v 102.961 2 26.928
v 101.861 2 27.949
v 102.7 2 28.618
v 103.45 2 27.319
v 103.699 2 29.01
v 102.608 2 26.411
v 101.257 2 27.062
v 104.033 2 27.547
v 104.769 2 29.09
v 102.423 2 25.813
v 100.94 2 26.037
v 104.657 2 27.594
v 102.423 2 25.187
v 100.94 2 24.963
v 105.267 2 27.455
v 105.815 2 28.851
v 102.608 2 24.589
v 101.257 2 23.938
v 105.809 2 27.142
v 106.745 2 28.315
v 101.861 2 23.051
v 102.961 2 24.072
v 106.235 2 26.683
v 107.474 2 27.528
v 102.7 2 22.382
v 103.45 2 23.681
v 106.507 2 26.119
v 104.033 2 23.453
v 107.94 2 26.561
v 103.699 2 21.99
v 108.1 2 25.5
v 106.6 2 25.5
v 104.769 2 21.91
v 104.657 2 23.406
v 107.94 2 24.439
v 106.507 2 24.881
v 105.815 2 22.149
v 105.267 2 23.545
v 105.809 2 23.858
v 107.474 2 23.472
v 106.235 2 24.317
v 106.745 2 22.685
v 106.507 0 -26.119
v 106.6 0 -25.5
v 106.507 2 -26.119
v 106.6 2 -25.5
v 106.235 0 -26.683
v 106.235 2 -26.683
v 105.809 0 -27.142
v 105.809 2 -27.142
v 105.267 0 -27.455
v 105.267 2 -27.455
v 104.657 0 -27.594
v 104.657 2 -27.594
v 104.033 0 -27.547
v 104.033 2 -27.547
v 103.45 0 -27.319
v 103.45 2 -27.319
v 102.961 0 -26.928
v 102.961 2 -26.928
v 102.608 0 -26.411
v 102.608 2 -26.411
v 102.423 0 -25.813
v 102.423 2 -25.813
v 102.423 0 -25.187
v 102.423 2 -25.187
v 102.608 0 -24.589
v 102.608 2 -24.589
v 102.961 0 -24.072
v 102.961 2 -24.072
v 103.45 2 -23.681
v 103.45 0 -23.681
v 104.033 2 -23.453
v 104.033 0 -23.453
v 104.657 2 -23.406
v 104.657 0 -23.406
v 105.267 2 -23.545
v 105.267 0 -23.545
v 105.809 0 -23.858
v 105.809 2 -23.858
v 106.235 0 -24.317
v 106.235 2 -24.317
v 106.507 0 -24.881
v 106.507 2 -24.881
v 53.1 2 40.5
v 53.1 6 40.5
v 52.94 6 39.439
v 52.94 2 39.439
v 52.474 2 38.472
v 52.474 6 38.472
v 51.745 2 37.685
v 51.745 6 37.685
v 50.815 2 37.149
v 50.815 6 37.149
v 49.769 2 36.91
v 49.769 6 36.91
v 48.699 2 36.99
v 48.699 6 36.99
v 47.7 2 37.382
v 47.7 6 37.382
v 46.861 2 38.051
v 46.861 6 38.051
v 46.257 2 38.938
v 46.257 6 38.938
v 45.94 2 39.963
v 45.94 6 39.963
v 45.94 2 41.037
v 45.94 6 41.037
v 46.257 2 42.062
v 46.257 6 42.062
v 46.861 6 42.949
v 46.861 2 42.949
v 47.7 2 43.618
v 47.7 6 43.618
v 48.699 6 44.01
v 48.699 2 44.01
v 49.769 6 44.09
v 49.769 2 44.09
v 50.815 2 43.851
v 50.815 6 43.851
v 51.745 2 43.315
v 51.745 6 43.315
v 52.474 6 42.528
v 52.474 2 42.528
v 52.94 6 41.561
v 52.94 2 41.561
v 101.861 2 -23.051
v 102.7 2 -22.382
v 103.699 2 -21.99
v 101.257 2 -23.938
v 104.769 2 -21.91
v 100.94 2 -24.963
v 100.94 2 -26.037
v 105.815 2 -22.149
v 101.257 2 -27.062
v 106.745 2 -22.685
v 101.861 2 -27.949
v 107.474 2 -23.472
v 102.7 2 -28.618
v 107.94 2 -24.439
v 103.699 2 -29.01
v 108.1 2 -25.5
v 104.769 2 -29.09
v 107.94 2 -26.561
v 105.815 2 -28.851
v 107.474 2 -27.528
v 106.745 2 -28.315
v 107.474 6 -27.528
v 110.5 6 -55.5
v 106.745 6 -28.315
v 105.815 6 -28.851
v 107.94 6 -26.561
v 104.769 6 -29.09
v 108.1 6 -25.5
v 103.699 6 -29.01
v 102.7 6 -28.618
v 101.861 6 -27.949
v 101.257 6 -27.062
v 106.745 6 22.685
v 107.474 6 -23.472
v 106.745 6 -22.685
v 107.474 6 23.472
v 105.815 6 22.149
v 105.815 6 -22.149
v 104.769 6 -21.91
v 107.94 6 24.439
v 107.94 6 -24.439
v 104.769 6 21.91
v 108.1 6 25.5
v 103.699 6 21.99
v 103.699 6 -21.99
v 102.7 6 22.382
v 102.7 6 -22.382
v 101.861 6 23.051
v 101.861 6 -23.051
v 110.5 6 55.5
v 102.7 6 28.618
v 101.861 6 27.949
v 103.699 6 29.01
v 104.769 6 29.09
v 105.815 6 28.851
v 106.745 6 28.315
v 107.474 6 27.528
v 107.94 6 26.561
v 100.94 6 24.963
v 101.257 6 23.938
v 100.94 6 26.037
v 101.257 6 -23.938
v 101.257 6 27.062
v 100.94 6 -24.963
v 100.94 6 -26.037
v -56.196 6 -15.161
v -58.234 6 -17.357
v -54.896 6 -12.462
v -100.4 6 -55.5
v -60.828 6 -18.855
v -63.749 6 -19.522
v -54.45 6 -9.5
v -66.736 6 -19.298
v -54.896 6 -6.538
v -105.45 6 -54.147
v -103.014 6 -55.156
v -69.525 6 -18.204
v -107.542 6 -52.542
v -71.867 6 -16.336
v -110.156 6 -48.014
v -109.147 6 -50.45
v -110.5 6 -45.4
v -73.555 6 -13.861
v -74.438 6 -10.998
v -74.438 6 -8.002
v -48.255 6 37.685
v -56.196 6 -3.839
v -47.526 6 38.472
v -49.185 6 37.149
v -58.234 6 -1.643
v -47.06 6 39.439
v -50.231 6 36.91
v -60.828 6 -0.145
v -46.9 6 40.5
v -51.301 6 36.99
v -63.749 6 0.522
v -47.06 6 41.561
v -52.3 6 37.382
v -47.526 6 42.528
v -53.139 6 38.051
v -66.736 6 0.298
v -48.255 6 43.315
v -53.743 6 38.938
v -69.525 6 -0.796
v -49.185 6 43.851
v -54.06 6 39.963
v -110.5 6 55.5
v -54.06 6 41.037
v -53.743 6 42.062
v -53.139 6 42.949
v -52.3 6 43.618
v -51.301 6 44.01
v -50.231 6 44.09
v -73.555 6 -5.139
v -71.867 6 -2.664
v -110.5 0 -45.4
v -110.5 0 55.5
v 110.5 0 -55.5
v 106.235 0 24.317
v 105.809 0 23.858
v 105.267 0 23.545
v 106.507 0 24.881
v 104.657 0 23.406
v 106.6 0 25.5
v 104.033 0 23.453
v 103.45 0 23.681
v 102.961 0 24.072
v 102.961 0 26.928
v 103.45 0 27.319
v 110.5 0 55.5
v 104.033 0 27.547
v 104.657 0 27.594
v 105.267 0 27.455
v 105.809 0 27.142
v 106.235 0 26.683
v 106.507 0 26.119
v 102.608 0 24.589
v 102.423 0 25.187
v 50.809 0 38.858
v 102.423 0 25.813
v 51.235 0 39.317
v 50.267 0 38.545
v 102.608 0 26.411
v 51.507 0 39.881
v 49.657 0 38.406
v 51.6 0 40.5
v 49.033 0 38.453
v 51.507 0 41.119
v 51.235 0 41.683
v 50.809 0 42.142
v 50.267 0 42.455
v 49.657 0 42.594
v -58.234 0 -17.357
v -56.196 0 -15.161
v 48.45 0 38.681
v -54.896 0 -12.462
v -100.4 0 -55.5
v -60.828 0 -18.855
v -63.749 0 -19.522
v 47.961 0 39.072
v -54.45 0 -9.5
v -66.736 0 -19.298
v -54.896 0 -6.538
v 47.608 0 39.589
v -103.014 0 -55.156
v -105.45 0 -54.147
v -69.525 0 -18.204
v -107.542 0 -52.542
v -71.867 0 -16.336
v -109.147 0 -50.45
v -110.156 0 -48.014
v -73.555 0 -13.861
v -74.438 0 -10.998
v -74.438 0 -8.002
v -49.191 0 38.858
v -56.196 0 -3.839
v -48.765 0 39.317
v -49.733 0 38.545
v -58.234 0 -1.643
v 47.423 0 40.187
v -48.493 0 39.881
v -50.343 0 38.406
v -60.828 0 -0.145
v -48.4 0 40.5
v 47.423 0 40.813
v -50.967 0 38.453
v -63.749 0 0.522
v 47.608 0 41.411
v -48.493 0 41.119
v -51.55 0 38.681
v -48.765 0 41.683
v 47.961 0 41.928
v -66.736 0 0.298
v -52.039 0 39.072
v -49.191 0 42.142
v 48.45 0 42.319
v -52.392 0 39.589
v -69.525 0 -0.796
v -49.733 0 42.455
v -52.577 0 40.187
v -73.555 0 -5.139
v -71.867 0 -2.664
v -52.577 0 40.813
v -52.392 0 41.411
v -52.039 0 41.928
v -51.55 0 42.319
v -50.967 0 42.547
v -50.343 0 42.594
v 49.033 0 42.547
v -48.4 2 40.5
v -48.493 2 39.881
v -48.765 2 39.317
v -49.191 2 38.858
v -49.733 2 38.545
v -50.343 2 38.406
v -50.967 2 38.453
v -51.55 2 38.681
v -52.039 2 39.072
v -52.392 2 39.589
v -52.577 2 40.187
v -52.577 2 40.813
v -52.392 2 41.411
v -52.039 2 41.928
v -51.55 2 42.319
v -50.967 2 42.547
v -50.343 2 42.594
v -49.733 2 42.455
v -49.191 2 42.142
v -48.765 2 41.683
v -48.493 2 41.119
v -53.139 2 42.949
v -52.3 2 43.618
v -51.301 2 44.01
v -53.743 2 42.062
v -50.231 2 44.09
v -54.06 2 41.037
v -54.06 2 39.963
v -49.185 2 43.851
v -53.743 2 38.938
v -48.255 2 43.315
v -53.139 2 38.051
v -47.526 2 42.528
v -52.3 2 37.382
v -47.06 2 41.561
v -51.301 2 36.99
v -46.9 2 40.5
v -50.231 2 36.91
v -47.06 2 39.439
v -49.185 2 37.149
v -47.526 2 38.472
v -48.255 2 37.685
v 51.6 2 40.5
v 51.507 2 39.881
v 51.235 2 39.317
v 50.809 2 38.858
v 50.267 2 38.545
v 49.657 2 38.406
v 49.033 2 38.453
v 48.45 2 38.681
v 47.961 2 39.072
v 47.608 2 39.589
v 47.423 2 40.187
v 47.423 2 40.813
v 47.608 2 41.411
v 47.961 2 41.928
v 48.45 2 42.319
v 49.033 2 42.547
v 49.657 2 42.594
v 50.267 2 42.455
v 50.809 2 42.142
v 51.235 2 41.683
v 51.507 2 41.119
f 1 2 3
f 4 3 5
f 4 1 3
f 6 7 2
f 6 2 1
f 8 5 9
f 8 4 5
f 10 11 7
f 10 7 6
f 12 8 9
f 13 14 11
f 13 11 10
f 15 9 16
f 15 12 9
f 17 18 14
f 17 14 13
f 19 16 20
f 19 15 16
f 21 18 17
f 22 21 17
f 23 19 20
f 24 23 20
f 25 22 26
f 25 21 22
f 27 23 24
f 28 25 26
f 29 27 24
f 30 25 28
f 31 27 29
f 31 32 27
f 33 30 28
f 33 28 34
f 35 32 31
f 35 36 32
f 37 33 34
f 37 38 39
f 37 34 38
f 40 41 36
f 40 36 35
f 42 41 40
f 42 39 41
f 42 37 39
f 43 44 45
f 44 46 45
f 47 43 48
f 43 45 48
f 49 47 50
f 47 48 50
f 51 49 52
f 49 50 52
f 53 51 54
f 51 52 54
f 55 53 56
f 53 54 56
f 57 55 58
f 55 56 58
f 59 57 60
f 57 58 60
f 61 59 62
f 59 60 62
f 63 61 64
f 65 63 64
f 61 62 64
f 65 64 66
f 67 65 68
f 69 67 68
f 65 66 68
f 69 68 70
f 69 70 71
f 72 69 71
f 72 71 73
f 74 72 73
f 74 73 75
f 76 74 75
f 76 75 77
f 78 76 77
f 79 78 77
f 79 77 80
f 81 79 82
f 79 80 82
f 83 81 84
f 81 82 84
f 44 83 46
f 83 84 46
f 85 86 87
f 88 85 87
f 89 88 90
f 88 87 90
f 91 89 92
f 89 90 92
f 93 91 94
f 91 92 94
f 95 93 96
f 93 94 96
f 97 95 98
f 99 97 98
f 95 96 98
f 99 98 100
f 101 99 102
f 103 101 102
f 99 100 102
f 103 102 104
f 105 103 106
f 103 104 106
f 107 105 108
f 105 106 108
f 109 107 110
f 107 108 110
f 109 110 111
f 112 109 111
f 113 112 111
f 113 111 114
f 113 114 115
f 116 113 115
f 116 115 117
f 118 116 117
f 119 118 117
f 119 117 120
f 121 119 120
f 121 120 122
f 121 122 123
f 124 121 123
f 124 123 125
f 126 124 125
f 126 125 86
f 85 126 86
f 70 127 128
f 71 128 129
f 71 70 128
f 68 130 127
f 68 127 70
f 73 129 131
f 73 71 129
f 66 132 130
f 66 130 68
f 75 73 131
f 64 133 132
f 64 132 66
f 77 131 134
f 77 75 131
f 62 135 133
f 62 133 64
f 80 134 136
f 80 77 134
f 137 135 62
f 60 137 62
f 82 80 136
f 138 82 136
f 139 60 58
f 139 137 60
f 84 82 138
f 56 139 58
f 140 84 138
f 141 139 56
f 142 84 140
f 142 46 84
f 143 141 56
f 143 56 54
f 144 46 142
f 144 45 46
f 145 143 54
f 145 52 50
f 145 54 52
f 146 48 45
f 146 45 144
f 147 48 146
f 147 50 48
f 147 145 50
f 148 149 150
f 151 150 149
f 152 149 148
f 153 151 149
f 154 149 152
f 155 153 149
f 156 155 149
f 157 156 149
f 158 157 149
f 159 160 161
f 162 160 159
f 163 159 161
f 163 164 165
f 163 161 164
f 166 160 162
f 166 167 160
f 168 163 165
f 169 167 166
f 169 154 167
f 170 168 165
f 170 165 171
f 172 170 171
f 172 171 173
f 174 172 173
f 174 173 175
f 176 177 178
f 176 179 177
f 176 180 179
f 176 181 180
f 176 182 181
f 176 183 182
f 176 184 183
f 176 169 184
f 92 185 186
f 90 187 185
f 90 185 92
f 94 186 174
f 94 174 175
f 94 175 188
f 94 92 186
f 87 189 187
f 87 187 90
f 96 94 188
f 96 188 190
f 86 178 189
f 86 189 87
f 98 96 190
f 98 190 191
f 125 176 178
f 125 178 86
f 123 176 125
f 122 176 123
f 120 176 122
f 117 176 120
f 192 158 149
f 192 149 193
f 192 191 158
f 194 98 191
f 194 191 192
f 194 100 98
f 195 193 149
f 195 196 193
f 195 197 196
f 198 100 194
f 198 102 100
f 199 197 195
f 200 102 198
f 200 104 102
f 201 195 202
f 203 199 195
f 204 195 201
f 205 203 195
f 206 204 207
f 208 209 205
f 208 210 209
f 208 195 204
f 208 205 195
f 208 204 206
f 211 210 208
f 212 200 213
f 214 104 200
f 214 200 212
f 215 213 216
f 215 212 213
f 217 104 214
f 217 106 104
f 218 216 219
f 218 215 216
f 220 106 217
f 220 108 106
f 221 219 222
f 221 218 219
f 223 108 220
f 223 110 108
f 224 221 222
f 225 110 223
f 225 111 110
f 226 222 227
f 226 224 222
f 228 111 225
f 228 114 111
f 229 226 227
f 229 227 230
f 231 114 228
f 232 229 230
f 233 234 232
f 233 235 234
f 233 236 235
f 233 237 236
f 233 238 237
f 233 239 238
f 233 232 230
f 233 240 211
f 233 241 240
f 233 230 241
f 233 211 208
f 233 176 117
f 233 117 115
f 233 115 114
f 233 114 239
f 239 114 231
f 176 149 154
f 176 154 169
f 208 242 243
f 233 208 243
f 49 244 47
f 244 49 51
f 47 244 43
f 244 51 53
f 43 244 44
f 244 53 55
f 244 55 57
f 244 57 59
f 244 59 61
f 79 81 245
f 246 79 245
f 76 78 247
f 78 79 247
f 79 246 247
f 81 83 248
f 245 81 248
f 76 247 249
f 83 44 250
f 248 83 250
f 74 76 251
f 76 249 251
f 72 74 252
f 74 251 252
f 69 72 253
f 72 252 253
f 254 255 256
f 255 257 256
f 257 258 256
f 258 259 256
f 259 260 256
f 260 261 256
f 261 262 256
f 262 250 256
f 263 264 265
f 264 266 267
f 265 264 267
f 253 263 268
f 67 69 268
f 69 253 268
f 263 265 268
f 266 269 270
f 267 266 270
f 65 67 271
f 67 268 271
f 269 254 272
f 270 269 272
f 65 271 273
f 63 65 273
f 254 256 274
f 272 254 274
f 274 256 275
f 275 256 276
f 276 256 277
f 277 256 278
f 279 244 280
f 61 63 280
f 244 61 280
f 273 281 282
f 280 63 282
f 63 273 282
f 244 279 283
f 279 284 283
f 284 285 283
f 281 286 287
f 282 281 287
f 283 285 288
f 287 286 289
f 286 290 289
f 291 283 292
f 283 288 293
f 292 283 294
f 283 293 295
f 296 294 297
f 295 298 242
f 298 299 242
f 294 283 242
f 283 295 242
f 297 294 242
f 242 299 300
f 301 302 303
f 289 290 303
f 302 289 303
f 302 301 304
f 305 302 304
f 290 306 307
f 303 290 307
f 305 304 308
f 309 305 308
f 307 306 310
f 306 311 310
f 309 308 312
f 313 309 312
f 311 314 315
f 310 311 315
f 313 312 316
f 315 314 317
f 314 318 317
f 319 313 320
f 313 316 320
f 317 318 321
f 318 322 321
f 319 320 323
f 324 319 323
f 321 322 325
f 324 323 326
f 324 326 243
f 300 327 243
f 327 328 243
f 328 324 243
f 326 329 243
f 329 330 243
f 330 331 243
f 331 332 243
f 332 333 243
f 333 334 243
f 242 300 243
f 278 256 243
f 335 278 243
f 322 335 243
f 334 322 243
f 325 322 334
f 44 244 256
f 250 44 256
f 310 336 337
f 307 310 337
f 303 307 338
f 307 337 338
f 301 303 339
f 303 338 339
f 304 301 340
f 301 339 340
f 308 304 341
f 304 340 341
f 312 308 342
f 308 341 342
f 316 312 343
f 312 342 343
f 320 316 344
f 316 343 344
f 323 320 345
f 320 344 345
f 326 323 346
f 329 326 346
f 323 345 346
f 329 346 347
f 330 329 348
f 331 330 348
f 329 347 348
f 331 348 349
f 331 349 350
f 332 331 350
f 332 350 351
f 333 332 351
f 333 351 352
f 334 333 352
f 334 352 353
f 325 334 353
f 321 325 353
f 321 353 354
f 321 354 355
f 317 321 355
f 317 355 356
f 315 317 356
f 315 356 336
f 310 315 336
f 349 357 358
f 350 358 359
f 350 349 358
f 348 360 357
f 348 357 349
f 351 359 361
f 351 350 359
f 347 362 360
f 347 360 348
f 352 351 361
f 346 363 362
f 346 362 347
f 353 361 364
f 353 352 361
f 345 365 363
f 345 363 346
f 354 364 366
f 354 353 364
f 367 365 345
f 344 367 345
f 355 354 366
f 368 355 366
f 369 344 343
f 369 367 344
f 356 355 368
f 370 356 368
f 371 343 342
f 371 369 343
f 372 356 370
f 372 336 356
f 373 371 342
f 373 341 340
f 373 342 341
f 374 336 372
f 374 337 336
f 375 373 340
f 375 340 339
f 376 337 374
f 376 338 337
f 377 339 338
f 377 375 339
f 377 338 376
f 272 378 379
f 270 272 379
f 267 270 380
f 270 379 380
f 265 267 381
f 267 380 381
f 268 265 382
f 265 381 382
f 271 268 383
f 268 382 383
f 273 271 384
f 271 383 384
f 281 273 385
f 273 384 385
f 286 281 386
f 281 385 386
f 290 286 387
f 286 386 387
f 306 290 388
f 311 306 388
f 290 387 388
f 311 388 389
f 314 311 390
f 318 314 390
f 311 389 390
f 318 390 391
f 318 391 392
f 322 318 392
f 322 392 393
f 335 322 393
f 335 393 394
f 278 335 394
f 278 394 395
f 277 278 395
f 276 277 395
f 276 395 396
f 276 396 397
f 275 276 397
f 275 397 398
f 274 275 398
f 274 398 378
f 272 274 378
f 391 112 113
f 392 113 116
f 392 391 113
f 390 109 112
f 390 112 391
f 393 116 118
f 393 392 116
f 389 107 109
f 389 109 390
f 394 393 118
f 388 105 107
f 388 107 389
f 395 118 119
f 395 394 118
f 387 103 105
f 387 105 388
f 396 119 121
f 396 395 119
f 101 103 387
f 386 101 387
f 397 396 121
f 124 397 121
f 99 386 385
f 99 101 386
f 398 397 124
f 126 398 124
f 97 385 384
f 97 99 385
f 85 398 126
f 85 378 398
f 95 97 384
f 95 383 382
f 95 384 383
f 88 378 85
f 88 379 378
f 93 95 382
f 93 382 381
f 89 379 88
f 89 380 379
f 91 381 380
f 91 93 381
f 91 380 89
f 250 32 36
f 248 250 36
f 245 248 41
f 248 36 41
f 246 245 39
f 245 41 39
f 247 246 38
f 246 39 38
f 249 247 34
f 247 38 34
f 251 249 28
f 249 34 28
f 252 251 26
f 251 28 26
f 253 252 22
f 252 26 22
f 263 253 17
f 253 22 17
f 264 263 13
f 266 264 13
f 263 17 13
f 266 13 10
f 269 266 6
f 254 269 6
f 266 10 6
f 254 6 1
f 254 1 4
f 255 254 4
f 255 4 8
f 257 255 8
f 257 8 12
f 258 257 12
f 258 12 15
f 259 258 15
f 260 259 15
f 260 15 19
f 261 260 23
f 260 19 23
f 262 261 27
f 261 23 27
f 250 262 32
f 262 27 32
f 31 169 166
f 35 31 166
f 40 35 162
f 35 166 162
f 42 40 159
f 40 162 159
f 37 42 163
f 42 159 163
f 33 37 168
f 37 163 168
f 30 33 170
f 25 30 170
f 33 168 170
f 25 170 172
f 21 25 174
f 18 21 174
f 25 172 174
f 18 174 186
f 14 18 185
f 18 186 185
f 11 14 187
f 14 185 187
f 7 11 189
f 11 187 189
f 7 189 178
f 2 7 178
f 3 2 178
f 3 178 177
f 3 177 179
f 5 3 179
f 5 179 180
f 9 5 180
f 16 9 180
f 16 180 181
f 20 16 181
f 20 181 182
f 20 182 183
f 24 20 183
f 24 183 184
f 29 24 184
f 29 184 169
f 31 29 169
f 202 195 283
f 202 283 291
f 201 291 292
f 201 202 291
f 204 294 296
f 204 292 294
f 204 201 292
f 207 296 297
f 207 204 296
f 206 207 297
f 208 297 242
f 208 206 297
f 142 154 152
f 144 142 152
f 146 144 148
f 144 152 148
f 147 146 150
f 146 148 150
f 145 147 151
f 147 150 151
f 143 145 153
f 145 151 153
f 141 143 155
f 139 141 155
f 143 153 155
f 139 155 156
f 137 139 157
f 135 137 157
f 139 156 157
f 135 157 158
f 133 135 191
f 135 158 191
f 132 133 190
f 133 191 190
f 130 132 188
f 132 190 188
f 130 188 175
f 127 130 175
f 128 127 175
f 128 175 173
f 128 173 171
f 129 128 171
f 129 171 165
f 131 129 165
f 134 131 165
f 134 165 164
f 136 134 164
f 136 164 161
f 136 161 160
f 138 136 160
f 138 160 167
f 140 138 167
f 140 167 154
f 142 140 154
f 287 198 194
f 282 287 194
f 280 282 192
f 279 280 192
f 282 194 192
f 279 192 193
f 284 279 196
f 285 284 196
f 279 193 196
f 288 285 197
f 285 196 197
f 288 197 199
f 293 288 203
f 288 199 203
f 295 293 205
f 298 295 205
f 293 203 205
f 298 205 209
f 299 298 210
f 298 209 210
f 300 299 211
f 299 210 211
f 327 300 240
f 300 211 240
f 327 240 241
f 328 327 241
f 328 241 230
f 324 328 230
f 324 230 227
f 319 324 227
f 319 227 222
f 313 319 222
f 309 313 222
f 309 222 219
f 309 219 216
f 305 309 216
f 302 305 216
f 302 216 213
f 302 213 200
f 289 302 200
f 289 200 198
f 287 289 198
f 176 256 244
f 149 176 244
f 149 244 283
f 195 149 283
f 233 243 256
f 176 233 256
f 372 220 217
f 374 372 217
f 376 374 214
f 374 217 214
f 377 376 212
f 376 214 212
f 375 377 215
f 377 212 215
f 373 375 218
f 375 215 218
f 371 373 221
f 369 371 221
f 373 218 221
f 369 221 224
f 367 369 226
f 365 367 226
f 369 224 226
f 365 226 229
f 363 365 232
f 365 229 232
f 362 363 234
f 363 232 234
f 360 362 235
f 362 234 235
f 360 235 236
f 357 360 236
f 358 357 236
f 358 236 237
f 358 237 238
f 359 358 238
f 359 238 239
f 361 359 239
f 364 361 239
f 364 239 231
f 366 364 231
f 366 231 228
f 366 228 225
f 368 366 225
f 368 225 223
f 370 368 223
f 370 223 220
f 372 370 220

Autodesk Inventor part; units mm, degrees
ref_plane "YZ Plane" through (0, 0, 0) normal (1, 0, 0) x (0, 1, 0)
ref_plane "XZ Plane" through (0, 0, 0) normal (0, 1, 0) x (-1, 0, 0)
ref_plane "XY Plane" through (0, 0, 0) normal (0, 0, 1) x (1, 0, 0)
sketch "草图1" plane through (0, 0, 0) normal (0, 1, 0) x (-1, 0, 0)
  line L0 (110.5, 55.5) -> (-110.5, 55.5)
  line L1 (-110.5, 55.5) -> (-110.5, -55.5)
  line L2 (-110.5, -55.5) -> (110.5, -55.5)
  line L3 (110.5, -55.5) -> (110.5, 55.5)
  line L4 (0, 7.5575) -> (0, -11)
  line L5 (8.5019, 0) -> (-7, 0)
  point P0 (0, 0)
  point P1 (0, 0)
  point P2 (0, 0)
  dimension "d0" = 221
  dimension "d1" = 111
extrude "拉伸1" add sketch "草图1" along normal blind 6
fillet "圆角1" radius 10.1 1 edges at (-110.5, 3, -55.5)
sketch "草图2" plane through (0, 6, 0) normal (0, 1, 0) x (1, 0, 0)
  circle A0 centre (-64.5, 9.5) radius 10.05
  line L0 (110.5, 55.5) -> (-100.4, 55.5) projected
  line L1 (-110.5, 45.4) -> (-110.5, -55.5) projected
  point P0 (0, 0)
  dimension "d5" = 20.1
  dimension "d6" = 46
  dimension "d7" = 46
extrude "拉伸2" cut sketch "草图2" against normal blind 6
sketch "草图3" plane through (0, 6, 0) normal (0, 1, 0) x (1, 0, 0)
  circle A0 centre (-104.5, 25.5) radius 2.1
  circle A1 centre (-104.5, -25.5) radius 2.1
  line L0 (-110.5, -55.5) -> (-110.5, 55.5)
  line L1 (110.5, -55.5) -> (-110.5, -55.5)
  line L2 (-110.5, 55.5) -> (100.4, 55.5)
  circle A2 centre (104.5, -25.5) radius 2.1
  circle A3 centre (104.5, 25.5) radius 2.1
  line L3 (110.5, -55.5) -> (110.5, 55.5) projected
  point P0 (0, 0)
  point P1 (0, 0)
  dimension "d10" = 4.2
  dimension "d11" = 4.2
  dimension "d12" = 6
  dimension "d13" = 6
  dimension "d14" = 30
  dimension "d15" = 30
  dimension "d16" = 4.2
  dimension "d17" = 4.2
  dimension "d18" = 30
  dimension "d19" = 6
  dimension "d20" = 30
  dimension "d21" = 6
extrude "拉伸3" cut sketch "草图3" against normal blind 10 contours A2 | A3
sketch "草图4" plane through (0, 6, 0) normal (0, 1, 0) x (1, 0, 0)
  circle A0 centre (104.5, -25.5) radius 2.1 projected
  circle A1 centre (104.5, -25.5) radius 3.6
  circle A2 centre (104.5, 25.5) radius 2.1 projected
  circle A3 centre (104.5, 25.5) radius 3.6
  point P0 (0, 0)
  dimension "d24" = 7.2
  dimension "d25" = 7.2
extrude "拉伸4" cut sketch "草图4" against normal blind 4 contours A0 | A1 | A2 | A3
sketch "草图5" plane through (0, 6, 0) normal (0, 1, 0) x (1, 0, 0)
  circle A0 centre (49.5, -40.5) radius 2.1
  circle A1 centre (-50.5, -40.5) radius 2.1
  line L0 (-110.5, -55.5) -> (110.5, -55.5) projected
  line L1 (-110.5, 45.4) -> (-110.5, -55.5) projected
  point P0 (0, 0)
  dimension "d28" = 4.2
  dimension "d29" = 4.2
  dimension "d30" = 15
  dimension "d31" = 15
  dimension "d32" = 60
  dimension "d33" = 100
extrude "拉伸5" cut sketch "草图5" against normal blind 6
sketch "草图6" plane through (0, 6, 0) normal (0, 1, 0) x (1, 0, 0)
  circle A0 centre (49.5, -40.5) radius 2.1 projected
  circle A1 centre (49.5, -40.5) radius 3.6
  circle A2 centre (-50.5, -40.5) radius 2.1 projected
  circle A3 centre (-50.5, -40.5) radius 3.6
  point P0 (0, 0)
  dimension "d36" = 7.2
  dimension "d37" = 7.2
extrude "拉伸6" cut sketch "草图6" against normal blind 4 contours A0 | A1 | A2 | A3
properties part number "底板_C"
